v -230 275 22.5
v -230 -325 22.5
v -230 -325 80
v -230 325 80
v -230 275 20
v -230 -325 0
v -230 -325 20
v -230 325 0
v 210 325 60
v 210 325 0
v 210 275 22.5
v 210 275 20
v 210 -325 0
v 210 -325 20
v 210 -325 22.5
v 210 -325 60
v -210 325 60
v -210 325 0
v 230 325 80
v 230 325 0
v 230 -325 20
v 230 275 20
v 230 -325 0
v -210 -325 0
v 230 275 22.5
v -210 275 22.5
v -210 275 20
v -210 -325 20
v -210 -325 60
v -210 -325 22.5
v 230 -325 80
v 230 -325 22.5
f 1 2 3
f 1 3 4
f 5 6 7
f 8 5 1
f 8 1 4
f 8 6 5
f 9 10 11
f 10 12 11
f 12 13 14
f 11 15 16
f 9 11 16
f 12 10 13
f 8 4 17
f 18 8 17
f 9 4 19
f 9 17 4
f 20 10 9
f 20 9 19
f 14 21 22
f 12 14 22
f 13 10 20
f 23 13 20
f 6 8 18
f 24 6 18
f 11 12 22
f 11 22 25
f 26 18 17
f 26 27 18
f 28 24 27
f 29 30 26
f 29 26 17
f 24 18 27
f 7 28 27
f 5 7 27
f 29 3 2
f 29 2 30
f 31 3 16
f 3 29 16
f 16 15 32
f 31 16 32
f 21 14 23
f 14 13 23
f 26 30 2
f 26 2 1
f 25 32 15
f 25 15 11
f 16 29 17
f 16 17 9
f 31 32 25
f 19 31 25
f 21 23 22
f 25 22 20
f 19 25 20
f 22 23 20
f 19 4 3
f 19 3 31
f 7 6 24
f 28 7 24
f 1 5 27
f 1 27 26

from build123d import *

# Parameters (mm, degrees)
F0_W     = 460
F0_H     = 650
F1_DEPTH = 80
F2_W     = 420
F2_H     = 60
F3_DEPTH = 650.001
F4_W     = 600
F4_H     = 2.5
F5_DEPTH = 460.001


with BuildPart() as f1:
    # F0 (on Top) → F1 (new body)
    with BuildSketch(Plane.XY):
        Rectangle(F0_W, F0_H)
    extrude(amount=F1_DEPTH)

    # F2 (on face) → F3 (cut, through all)
    with BuildSketch(Plane.XZ.offset(325)):
        with Locations((0, 30)):
            Rectangle(F2_W, F2_H)
    extrude(amount=-F3_DEPTH, mode=Mode.SUBTRACT)

    # F4 (on face) → F5 (cut, through all)
    with BuildSketch(Plane.YZ.offset(230)):
        with Locations((-25, 21.25)):
            Rectangle(F4_W, F4_H)
    extrude(amount=-F5_DEPTH, mode=Mode.SUBTRACT)


solid = f1.part
